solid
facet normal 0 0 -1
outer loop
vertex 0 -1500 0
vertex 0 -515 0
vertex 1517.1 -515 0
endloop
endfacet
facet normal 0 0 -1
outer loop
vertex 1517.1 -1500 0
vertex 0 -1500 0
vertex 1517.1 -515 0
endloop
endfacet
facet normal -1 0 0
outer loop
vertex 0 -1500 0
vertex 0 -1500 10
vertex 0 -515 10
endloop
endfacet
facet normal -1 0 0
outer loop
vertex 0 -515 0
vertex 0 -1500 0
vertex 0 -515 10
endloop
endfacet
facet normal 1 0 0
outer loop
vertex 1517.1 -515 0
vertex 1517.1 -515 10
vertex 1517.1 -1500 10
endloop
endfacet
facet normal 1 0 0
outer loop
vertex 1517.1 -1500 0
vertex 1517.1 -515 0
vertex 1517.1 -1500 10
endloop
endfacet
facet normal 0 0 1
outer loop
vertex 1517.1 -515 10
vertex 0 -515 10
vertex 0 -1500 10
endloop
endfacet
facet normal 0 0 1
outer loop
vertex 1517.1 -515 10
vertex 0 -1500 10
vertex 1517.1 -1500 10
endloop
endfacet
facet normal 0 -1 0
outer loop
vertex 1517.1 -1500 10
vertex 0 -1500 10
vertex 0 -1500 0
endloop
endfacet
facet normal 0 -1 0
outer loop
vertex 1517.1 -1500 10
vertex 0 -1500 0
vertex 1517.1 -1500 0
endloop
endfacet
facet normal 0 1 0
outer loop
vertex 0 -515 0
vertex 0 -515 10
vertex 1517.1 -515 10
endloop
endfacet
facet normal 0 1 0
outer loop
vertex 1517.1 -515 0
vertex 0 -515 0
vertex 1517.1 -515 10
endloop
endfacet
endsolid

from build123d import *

# Parameters (mm, degrees)
SKETCH2_W           = 1500
SKETCH2_H           = 500
BOSS_EXTRUDE1_DEPTH = 10
SKETCH3_W           = 3000
SKETCH3_H           = 2000
BOSS_EXTRUDE2_DEPTH = 10
CUT_EXTRUDE1_DEPTH  = 10


with BuildPart() as part:
    # Sketch2 → Boss-Extrude1 (new body)
    with BuildSketch(Plane.XY):
        with Locations((750, 250)):
            Rectangle(SKETCH2_W, SKETCH2_H)
    extrude(amount=BOSS_EXTRUDE1_DEPTH)

    # Sketch3 → Boss-Extrude2 (add)
    with BuildSketch(Plane.XY.offset(10)):
        with Locations((1500, -500)):
            Rectangle(SKETCH3_W, SKETCH3_H)
    extrude(amount=-BOSS_EXTRUDE2_DEPTH)

    # Sketch4 → Cut-Extrude1 (cut)
    with BuildSketch(Plane.XY.offset(10)):
        Polygon((1517.1, -515), (1517.1, -1500), (3000, -1500), (3000, 500), (0, 500), (0, -515), align=None)
    extrude(amount=-CUT_EXTRUDE1_DEPTH, mode=Mode.SUBTRACT)


solid = part.part
